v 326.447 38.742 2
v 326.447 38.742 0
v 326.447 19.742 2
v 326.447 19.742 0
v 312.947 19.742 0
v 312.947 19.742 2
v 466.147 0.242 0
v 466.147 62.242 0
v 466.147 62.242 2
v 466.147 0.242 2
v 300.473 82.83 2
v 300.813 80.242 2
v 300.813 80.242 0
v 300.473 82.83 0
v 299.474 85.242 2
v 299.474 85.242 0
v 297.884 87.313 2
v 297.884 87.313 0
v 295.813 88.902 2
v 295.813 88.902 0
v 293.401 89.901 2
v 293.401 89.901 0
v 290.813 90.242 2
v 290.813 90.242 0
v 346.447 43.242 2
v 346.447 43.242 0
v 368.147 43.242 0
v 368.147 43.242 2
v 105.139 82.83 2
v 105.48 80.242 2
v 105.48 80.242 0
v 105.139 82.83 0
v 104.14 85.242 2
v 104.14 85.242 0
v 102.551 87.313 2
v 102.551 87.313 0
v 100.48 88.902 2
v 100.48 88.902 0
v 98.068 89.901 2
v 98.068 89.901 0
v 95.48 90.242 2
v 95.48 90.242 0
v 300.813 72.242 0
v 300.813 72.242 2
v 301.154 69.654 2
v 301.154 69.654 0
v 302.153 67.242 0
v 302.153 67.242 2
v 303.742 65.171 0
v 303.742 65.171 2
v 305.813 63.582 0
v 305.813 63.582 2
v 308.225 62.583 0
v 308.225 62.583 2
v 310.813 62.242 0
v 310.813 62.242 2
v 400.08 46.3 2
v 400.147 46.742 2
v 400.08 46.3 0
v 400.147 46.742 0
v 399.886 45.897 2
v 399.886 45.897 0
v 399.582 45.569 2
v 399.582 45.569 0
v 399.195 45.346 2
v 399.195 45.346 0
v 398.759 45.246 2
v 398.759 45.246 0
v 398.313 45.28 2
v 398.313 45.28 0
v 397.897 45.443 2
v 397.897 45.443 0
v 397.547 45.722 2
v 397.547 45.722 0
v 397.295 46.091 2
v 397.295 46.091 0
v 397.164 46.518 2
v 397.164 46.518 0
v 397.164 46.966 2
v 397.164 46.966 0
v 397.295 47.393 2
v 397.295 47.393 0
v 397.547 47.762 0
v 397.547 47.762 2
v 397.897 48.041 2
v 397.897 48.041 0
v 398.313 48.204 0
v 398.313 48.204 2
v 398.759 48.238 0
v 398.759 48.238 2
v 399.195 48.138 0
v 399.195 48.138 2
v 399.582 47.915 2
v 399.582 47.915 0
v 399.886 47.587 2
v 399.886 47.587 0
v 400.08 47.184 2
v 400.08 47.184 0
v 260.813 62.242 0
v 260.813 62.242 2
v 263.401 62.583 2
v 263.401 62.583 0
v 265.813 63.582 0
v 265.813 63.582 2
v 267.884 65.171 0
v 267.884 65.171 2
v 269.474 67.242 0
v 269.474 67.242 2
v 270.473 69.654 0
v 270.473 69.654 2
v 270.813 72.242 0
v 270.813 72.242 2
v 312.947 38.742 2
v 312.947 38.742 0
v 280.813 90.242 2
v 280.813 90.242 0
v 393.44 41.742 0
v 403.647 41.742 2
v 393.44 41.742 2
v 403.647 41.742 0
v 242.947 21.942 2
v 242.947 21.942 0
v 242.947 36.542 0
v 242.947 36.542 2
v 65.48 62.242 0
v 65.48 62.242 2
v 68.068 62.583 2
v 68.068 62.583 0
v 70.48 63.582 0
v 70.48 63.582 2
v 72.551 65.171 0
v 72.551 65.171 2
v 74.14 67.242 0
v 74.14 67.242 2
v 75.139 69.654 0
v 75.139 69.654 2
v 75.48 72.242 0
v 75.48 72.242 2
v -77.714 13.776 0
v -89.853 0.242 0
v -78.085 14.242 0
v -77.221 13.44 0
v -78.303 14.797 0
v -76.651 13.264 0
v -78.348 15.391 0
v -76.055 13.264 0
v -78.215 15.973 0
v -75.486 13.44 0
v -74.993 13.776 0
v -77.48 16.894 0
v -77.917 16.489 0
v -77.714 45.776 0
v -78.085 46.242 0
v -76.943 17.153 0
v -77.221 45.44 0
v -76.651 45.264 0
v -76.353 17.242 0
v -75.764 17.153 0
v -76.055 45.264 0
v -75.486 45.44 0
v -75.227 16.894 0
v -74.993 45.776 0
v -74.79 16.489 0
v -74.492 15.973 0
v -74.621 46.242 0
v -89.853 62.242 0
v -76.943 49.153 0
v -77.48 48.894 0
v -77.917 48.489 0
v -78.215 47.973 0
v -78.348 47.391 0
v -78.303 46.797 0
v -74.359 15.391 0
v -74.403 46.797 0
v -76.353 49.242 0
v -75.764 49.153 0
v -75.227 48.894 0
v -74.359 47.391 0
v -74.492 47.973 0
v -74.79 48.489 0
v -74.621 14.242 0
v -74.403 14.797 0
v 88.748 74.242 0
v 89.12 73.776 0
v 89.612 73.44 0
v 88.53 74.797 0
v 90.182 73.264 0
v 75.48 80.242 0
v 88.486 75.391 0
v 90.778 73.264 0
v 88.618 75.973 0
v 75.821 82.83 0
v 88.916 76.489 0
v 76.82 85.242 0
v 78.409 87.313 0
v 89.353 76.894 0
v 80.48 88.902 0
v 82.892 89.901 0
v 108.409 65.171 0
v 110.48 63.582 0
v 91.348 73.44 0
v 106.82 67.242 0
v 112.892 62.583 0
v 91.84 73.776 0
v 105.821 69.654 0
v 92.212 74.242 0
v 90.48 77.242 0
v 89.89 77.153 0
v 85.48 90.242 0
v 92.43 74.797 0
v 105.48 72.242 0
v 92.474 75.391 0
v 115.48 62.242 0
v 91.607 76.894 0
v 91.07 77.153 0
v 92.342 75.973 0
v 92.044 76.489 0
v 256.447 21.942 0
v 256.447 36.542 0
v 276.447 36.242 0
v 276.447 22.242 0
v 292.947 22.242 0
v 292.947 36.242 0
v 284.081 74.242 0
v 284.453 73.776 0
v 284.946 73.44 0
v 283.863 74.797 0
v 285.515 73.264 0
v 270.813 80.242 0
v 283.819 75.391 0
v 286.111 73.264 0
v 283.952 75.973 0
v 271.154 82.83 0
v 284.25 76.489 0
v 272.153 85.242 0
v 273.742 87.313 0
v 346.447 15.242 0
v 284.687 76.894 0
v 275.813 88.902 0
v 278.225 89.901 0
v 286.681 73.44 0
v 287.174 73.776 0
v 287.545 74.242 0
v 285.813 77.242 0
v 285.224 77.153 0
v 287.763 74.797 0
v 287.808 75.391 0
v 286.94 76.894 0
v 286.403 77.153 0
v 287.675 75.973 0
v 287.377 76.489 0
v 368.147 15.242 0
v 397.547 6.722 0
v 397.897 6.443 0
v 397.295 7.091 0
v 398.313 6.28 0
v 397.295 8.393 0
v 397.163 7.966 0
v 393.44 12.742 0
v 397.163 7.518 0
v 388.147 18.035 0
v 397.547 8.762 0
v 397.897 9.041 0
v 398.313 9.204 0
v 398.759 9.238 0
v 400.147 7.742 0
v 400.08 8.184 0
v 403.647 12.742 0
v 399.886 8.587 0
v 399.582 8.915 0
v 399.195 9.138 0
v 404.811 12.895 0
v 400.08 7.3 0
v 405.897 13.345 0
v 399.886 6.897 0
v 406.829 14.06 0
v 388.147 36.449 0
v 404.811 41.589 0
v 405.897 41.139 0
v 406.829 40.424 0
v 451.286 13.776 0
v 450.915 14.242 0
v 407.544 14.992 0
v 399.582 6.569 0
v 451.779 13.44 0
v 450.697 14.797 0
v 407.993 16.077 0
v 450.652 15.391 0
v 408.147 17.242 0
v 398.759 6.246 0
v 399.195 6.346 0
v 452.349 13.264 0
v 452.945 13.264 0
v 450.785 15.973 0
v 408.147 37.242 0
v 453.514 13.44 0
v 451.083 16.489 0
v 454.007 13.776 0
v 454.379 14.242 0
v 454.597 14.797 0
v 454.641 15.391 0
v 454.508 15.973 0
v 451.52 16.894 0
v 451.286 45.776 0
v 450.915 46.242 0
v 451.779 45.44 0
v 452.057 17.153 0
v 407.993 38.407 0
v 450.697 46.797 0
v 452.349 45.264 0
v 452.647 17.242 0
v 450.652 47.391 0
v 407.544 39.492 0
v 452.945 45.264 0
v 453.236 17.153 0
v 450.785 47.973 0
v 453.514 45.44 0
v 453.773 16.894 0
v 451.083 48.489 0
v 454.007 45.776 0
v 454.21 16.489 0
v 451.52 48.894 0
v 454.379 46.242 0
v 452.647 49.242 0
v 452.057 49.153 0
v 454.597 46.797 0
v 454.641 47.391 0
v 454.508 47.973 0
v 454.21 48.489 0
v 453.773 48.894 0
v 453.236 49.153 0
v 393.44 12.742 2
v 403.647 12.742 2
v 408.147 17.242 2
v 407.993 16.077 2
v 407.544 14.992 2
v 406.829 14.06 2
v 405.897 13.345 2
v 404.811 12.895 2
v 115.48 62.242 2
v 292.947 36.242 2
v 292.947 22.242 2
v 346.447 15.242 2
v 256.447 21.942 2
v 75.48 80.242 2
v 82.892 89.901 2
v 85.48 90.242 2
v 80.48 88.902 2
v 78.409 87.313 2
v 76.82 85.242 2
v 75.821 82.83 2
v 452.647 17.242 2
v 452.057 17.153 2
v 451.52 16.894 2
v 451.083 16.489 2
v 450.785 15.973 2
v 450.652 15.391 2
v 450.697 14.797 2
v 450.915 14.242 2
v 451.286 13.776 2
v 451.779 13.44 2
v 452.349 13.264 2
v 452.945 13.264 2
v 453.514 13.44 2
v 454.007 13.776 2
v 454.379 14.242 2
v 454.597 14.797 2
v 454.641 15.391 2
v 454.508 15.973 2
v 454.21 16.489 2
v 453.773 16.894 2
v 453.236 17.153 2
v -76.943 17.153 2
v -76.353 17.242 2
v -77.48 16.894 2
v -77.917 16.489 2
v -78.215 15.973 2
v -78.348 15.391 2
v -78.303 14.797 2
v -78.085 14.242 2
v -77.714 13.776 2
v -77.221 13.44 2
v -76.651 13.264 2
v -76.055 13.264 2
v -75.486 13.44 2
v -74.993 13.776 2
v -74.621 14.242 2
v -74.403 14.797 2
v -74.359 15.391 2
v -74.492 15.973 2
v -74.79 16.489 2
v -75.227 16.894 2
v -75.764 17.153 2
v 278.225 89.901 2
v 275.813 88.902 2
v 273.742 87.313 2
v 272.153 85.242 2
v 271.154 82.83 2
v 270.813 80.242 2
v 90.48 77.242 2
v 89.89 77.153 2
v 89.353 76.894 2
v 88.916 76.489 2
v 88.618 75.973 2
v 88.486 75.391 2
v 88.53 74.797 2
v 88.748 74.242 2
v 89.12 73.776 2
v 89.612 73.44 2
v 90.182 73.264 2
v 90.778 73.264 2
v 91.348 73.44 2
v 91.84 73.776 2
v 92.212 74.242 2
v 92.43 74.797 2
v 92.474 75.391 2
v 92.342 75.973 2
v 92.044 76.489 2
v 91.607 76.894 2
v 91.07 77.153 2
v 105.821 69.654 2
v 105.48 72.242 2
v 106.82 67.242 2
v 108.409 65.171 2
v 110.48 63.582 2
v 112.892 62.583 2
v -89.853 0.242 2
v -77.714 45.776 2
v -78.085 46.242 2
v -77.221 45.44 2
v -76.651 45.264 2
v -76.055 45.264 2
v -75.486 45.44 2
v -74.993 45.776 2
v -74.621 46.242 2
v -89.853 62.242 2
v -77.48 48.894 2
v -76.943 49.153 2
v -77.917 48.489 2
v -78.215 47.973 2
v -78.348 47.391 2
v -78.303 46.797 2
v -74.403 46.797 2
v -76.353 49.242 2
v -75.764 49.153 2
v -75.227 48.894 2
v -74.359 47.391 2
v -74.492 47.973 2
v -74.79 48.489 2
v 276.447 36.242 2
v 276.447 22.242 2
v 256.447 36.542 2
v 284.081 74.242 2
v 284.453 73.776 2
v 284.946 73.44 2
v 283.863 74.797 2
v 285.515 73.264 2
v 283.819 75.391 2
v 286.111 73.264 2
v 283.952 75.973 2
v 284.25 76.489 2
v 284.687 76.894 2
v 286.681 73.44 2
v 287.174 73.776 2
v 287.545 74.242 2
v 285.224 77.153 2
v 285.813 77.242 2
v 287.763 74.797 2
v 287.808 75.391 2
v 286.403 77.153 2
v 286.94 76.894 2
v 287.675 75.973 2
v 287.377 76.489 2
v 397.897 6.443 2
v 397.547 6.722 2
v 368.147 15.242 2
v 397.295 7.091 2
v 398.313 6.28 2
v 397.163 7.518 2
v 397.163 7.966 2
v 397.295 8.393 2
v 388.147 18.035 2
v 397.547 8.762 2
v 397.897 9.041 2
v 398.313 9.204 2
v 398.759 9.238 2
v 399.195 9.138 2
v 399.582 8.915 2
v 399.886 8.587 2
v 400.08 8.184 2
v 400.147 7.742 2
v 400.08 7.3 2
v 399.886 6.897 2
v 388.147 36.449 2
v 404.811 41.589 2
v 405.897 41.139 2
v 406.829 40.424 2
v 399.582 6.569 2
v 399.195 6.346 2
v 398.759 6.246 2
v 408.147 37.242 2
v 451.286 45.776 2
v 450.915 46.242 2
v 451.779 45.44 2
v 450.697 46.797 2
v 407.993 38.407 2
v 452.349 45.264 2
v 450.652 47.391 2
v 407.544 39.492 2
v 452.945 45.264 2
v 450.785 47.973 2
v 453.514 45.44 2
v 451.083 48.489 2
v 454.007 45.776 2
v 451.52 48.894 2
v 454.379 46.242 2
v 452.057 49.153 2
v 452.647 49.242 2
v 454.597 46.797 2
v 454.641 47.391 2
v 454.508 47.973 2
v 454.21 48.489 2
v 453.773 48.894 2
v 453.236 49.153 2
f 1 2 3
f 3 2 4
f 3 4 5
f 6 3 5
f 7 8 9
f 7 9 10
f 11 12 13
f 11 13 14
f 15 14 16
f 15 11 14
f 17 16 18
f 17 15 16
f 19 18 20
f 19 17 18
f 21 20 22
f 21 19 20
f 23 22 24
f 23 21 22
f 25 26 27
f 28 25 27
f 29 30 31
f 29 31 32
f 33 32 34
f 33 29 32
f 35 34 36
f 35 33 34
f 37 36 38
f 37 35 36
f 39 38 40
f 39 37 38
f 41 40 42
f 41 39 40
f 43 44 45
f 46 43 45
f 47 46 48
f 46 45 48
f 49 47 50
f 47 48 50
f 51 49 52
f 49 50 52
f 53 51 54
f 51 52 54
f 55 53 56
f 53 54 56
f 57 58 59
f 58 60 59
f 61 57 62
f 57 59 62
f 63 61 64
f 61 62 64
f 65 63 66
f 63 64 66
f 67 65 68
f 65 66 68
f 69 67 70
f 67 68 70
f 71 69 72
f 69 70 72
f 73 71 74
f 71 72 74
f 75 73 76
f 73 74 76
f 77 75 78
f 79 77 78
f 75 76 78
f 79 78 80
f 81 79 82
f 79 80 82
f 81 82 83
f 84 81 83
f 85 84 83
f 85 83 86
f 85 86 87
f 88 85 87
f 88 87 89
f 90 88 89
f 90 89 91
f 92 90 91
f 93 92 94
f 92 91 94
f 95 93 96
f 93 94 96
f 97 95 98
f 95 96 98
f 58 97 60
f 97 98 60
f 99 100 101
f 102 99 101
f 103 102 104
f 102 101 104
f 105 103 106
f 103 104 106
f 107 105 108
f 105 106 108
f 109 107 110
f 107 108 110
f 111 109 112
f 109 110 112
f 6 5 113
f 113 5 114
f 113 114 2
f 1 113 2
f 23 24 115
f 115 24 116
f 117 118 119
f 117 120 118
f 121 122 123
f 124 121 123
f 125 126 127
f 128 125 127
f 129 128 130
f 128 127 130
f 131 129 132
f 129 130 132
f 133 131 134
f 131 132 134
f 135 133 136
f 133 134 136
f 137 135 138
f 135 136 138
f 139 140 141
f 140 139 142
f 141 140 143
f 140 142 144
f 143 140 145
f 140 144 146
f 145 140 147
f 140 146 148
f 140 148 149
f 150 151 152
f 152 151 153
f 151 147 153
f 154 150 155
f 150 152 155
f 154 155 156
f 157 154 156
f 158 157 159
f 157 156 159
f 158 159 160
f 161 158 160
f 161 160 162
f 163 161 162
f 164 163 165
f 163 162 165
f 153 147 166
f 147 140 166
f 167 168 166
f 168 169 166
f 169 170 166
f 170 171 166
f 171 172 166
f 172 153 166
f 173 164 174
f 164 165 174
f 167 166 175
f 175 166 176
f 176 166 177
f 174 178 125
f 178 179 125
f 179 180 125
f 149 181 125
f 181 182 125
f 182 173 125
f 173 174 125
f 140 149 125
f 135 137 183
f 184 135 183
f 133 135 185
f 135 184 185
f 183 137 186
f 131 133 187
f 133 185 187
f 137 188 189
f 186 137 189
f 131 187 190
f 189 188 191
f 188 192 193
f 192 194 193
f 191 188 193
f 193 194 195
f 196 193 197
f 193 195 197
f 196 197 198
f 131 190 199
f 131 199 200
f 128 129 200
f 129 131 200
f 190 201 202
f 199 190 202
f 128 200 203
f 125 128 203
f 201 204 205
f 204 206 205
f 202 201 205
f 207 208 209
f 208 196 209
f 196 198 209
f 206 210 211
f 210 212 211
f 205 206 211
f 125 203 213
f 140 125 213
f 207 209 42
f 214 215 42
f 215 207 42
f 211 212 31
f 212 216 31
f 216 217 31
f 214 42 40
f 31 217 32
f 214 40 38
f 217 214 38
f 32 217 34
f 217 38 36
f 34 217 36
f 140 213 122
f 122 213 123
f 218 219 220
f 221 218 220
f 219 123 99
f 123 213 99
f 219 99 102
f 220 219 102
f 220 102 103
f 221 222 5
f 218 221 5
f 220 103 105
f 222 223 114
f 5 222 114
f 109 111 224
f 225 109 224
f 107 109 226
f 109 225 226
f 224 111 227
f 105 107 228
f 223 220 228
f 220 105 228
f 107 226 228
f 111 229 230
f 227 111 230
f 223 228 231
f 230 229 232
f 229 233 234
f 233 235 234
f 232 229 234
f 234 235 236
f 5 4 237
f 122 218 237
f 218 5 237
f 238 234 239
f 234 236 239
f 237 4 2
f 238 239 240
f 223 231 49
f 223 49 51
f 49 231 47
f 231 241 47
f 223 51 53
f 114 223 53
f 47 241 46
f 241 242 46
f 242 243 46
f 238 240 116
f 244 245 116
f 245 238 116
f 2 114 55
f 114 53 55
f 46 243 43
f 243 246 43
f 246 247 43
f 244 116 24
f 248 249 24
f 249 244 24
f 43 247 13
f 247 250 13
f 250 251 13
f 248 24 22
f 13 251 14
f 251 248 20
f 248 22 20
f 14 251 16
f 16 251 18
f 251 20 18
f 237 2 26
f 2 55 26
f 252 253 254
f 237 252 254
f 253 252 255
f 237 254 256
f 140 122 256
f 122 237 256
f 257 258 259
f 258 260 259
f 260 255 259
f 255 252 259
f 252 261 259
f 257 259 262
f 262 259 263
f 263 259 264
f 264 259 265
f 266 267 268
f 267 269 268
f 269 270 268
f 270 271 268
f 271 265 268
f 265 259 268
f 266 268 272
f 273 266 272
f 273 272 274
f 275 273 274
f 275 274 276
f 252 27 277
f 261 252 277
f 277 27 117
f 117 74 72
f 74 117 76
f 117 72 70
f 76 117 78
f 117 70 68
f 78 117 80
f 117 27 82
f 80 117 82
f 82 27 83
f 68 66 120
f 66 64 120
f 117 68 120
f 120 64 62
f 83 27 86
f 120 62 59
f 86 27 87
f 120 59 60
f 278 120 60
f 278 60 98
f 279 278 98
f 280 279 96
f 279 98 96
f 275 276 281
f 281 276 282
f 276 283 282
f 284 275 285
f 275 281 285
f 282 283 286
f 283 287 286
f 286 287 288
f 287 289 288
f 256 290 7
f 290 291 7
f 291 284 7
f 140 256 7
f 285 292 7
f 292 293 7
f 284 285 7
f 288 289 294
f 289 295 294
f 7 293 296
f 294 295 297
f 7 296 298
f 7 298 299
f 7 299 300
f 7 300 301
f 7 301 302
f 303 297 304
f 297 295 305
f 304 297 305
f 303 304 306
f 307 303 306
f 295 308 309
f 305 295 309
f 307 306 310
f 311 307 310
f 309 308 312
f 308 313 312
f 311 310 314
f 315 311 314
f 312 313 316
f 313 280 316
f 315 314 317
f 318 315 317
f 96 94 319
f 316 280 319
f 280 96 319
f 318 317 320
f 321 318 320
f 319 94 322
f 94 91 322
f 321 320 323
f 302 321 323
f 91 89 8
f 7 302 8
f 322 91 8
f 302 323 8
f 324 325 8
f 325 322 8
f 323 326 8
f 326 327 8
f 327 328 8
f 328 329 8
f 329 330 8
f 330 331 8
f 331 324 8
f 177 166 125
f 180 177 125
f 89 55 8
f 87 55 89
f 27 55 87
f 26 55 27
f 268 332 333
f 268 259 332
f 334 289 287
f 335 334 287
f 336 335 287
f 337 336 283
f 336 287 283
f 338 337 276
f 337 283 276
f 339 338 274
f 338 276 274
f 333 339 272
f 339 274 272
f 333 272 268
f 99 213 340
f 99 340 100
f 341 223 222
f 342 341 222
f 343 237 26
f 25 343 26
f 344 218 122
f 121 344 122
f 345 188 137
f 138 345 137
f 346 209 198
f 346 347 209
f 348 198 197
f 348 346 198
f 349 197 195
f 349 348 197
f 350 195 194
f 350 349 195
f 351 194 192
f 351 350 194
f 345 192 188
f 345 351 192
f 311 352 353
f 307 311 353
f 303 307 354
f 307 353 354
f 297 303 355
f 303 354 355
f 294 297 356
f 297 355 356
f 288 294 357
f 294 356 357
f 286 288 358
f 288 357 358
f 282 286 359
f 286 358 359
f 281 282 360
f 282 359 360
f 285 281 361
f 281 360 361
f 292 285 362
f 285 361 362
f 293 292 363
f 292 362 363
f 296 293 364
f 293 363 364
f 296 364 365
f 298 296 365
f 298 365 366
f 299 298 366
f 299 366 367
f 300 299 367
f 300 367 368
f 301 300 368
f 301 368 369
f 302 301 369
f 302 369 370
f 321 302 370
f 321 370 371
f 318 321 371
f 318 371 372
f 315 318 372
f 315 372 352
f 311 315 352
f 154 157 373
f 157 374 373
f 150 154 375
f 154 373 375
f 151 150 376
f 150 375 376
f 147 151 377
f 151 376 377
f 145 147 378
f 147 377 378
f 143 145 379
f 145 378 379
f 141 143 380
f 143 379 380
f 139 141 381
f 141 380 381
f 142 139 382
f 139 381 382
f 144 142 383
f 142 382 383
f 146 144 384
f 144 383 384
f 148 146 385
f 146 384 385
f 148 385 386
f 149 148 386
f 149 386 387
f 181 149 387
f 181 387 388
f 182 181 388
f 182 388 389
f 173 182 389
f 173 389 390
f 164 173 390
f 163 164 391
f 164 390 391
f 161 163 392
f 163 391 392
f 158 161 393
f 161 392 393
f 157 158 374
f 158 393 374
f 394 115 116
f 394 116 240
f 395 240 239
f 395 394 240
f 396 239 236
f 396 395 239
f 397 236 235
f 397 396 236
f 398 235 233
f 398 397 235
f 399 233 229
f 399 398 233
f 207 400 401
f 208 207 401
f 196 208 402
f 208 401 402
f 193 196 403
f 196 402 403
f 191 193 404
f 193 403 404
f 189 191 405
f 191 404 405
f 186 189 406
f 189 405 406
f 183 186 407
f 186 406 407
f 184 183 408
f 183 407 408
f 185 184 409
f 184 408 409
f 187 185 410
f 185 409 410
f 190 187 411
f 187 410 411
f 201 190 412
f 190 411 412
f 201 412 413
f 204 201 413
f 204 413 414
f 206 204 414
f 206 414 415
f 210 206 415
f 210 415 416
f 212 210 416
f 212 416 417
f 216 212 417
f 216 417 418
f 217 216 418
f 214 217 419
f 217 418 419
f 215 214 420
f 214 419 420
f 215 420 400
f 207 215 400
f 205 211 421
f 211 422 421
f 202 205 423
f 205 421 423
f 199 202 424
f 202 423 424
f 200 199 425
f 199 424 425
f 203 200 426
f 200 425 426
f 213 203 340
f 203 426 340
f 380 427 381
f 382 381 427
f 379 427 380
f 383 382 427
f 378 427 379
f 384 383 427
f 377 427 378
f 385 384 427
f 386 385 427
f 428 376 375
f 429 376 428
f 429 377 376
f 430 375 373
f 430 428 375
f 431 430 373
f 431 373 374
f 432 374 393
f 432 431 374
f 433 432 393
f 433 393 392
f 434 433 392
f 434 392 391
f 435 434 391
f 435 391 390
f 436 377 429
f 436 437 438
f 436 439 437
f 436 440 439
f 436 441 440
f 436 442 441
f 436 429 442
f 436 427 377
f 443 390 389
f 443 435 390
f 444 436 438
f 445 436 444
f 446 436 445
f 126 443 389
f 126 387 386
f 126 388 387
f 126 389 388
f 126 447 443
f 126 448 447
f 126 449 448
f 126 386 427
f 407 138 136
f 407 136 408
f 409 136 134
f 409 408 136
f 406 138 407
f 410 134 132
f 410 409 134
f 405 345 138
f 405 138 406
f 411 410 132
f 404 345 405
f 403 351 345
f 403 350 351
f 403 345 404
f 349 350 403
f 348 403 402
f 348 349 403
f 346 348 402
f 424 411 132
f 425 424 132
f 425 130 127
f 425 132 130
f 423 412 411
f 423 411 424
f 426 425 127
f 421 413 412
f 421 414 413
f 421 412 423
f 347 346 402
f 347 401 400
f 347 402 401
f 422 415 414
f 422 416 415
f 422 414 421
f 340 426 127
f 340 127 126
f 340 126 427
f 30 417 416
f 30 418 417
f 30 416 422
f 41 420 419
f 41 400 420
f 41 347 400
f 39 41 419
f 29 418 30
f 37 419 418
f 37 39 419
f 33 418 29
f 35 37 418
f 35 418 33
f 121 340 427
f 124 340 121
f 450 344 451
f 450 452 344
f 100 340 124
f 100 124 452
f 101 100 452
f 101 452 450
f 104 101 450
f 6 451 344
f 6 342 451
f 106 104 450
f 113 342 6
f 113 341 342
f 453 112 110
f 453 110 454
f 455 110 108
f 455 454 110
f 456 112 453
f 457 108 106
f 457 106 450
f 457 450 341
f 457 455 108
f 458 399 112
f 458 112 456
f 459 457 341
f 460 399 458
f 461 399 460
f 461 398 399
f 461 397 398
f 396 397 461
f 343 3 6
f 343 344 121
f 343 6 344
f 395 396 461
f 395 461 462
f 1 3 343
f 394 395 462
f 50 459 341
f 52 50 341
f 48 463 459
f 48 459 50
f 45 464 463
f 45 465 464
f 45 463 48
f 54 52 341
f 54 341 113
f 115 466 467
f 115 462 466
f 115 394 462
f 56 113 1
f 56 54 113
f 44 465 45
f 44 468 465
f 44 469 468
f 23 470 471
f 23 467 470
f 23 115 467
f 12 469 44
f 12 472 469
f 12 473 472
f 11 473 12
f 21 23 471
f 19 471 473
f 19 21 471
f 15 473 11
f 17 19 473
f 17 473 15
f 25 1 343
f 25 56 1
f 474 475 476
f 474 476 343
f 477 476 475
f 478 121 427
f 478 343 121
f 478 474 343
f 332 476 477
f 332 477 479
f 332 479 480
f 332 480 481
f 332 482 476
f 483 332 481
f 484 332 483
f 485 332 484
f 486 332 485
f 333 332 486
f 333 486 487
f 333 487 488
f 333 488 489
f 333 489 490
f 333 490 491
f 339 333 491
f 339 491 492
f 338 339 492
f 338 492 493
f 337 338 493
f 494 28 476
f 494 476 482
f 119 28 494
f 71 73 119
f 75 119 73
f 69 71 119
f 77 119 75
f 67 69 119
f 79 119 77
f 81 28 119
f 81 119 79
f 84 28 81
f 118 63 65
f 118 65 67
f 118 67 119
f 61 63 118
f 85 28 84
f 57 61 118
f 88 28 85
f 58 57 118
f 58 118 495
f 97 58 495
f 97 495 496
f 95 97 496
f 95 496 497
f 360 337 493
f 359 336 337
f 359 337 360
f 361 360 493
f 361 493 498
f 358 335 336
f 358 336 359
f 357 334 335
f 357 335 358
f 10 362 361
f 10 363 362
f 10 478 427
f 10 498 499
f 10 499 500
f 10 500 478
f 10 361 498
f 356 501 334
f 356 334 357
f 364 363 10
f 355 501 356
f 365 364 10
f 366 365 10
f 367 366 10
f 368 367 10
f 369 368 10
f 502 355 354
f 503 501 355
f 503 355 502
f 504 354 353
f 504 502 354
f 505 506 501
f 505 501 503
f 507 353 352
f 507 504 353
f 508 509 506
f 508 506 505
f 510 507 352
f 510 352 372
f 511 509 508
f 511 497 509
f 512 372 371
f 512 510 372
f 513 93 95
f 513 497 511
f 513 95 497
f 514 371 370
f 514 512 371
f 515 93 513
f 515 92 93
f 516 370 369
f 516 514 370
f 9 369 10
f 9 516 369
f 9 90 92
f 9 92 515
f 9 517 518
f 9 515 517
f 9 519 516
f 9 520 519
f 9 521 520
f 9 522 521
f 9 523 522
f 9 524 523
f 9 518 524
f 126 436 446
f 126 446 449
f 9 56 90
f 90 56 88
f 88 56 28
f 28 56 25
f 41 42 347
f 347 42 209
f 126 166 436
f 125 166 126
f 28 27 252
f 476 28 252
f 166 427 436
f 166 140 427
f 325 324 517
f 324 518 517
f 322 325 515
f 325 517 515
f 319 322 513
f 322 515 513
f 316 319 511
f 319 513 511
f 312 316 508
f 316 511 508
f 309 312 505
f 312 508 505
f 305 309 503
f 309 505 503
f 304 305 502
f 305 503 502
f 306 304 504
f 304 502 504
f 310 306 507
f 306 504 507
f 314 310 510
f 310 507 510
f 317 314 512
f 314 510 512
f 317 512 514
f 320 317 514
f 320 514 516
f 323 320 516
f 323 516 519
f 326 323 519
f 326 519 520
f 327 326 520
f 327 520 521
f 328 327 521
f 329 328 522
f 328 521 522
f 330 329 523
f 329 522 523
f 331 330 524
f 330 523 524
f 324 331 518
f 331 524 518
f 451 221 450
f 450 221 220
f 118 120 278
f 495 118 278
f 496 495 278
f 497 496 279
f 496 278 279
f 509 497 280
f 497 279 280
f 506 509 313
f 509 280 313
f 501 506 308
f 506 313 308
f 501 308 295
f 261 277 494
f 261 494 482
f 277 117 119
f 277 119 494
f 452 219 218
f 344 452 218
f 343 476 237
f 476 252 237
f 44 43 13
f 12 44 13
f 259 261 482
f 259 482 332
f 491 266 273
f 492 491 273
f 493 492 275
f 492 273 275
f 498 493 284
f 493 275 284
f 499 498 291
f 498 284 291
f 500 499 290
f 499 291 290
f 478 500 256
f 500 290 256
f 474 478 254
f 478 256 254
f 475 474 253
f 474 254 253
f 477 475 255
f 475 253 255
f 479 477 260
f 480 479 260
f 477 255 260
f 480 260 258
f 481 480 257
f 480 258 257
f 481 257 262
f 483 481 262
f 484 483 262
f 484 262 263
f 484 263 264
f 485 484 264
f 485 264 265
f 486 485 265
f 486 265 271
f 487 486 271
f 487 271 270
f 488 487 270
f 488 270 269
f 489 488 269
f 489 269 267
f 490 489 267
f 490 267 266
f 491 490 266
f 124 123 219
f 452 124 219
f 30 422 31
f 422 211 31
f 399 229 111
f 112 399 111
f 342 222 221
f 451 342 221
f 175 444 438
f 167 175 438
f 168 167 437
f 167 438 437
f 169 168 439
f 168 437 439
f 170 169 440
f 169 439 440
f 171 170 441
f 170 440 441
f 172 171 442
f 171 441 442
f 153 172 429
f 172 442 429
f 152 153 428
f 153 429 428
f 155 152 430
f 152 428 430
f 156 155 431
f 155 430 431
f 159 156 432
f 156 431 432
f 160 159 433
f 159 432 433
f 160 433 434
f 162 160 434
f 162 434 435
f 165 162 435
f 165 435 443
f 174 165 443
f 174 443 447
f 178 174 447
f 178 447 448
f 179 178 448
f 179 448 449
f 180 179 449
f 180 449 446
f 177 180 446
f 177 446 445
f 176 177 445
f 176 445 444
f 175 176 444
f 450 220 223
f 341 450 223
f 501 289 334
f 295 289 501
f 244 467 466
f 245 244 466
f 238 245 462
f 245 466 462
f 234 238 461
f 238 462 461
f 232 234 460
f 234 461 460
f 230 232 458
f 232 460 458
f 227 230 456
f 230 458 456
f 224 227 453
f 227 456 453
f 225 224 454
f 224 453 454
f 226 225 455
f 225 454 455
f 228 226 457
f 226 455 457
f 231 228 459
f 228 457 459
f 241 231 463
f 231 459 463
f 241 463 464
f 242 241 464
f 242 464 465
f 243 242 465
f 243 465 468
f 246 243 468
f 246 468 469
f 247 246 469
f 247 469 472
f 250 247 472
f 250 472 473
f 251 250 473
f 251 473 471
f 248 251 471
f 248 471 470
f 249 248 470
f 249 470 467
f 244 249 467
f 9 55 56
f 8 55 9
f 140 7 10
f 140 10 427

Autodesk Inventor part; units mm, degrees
ref_plane "YZ Plane" through (0, 0, 0) normal (1, 0, 0) x (0, 1, 0)
ref_plane "XZ Plane" through (0, 0, 0) normal (0, 1, 0) x (-1, 0, 0)
ref_plane "XY Plane" through (0, 0, 0) normal (0, 0, 1) x (1, 0, 0)
sketch "Szkic1" plane through (0, 0, 0) normal (0, 0, 1) x (1, 0, 0)
  line L0 (-89.8533, 62.242) -> (466.1467, 62.242)
  line L1 (466.1467, 62.242) -> (466.1467, 0.242)
  line L2 (466.1467, 0.242) -> (-89.8533, 0.242)
  line L3 (-89.8533, 0.242) -> (-89.8533, 62.242)
  line L4 (75.48, 62.242) -> (105.48, 62.242)
  line L5 (105.48, 62.242) -> (105.48, 90.242)
  line L6 (105.48, 90.242) -> (75.48, 90.242)
  line L7 (75.48, 90.242) -> (75.48, 62.242)
  line L8 (270.8133, 62.242) -> (300.8133, 62.242)
  line L9 (300.8133, 62.242) -> (300.8133, 90.242)
  line L10 (300.8133, 90.242) -> (270.8133, 90.242)
  line L11 (270.8133, 90.242) -> (270.8133, 62.242)
  arc A0 (403.6467, 13.242) -> (407.6467, 17.242) centre (403.6467, 17.242) ccw
  line L12 (407.6467, 17.242) -> (407.6467, 37.242)
  arc A1 (407.6467, 37.242) -> (403.6467, 41.242) centre (403.6467, 37.242) ccw
  line L13 (388.647, 36.242) -> (393.647, 41.242)
  line L14 (388.647, 36.242) -> (388.647, 18.242)
  line L15 (393.647, 13.242) -> (388.647, 18.242)
  line L16 (393.647, 41.242) -> (403.6467, 41.242)
  line L17 (393.647, 13.242) -> (403.6467, 13.242)
  line L18 (393.4399, 41.742) -> (388.147, 36.4491)
  line L19 (388.147, 36.4491) -> (388.147, 18.0348)
  line L20 (388.147, 18.0348) -> (393.4399, 12.742)
  line L21 (393.4399, 12.742) -> (403.6467, 12.742)
  arc A2 (403.6467, 12.742) -> (408.1467, 17.242) centre (403.6467, 17.242) ccw
  line L22 (408.1467, 17.242) -> (408.1467, 37.242)
  arc A3 (408.1467, 37.242) -> (403.6467, 41.742) centre (403.6467, 37.242) ccw
  line L23 (403.6467, 41.742) -> (393.4399, 41.742)
  circle A4 centre (398.6468, 46.742) radius 1.5
  circle A5 centre (398.6467, 7.742) radius 1.5
  line L24 (346.447, 43.242) -> (368.147, 43.242)
  line L25 (368.147, 43.242) -> (368.147, 15.242)
  line L26 (368.147, 15.242) -> (346.447, 15.242)
  line L27 (346.447, 15.242) -> (346.447, 43.242)
  line L28 (276.447, 36.242) -> (292.947, 36.242)
  line L29 (292.947, 36.242) -> (292.947, 22.242)
  line L30 (292.947, 22.242) -> (276.447, 22.242)
  line L31 (276.447, 22.242) -> (276.447, 36.242)
  line L32 (242.947, 36.542) -> (256.447, 36.542)
  line L33 (256.447, 36.542) -> (256.447, 21.942)
  line L34 (256.447, 21.942) -> (242.947, 21.942)
  line L35 (242.947, 21.942) -> (242.947, 36.542)
  line L36 (312.947, 38.742) -> (326.447, 38.742)
  line L37 (326.447, 38.742) -> (326.447, 19.742)
  line L38 (326.447, 19.742) -> (312.947, 19.742)
  line L39 (312.947, 19.742) -> (312.947, 38.742)
  point P0 (90.48, 75.242)
  point P1 (285.8133, 75.242)
  point P2 (-76.3533, 47.242)
  point P3 (452.6467, 47.242)
  point P4 (-76.3533, 15.242)
  point P5 (452.6467, 15.242)
  dimension "d0" = 556
  dimension "d1" = 62
  dimension "d2" = 30
  dimension "d3" = 28
  dimension "d4" = 30
  dimension "d5" = 28
  dimension "d6" = 165.3333
  dimension "d10" = 165.3333
  dimension "d12" = 15
  dimension "d13" = 15
  dimension "d14" = 15
  dimension "d15" = 15
  dimension "d16" = 13.5
  dimension "d17" = 13.5
  dimension "d18" = 15
  dimension "d19" = 15
  dimension "d27" = 13.5
  dimension "d28" = 13.5
  dimension "d29" = 15
  dimension "d30" = 15
  dimension "d42" = 18.9997
  dimension "d43" = 58.5
  dimension "d44" = 28
  dimension "d45" = 21
  dimension "d46" = 14.9997
  dimension "d47" = 4
  dimension "d48" = 4
  dimension "d49" = 14.9997
  dimension "d50" = 5
  dimension "d51" = 5
  dimension "d54" = 0.5
  dimension "d55" = 5.5
  dimension "d56" = 5.5
  dimension "d57" = 8.9999
  dimension "d58" = 9
  dimension "d59" = 3
  dimension "d60" = 3
  dimension "d61" = 10.2068
  dimension "d62" = 9.9997
  dimension "d63" = 9.9997
  dimension "d64" = 10.2068
  dimension "d65" = 28
  dimension "d66" = 21.7
  dimension "d69" = 16.5
  dimension "d71" = 14
  dimension "d72" = 14.6
  dimension "d73" = 13.5
  dimension "d74" = 19
  dimension "d75" = 13.5
  dimension "d76" = 19
  dimension "d77" = 23.5
  dimension "d78" = 26
  dimension "d79" = 25.7
  dimension "d80" = 20
  dimension "d81" = 20
  dimension "d82" = 20
  dimension "d83" = 20
extrude "Wyciągnięcie proste1" add sketch "Szkic1" along normal blind 2 contours L0 L1 L2 L3 | L7 L6 L5 L0 | L11 L10 L9 L0 | L17 L15 L14 L13 L16 A1 L12 A0 | L23 A3 L22 A2 L21 L20 L19 L18 | A4 | A5 | L24 L25 L26 L27 | L28 L29 L30 L31 | L32 L33 L34 L35 | L36 L37 L38 L39
fillet "Zaokrąglenie1" radius 10 8 edges at (75.48, 62.242, 1) (75.48, 90.242, 1) (105.48, 90.242, 1) (105.48, 62.242, 1) (270.8133, 62.242, 1) (270.8133, 90.242, 1) (300.8133, 90.242, 1) (300.8133, 62.242, 1)
hole "Otwór1" at (90.48, 75.242, 0) at (285.8133, 75.242, 0) at (-76.3533, 47.242, 0) at (452.6467, 47.242, 0) at (-76.3533, 15.242, 0) at (452.6467, 15.242, 0) direction (0, 0, 1) diameter 4 end through all
extrude "Wyciągnięcie proste2" cut sketch "Szkic1" along normal through all contours L17 L15 L14 L13 L16 A1 L12 A0 | L23 A3 L22 A2 L21 L20 L19 L18 | A4 | A5 | L24 L25 L26 L27 | L28 L29 L30 L31 | L32 L33 L34 L35 | L36 L37 L38 L39
equation "\"d6\" = -0.333333 * d4 + 0.333333 * d0 - 0.333333 * d2"
equation "\"d10\" = d6"
equation "\"d14\" = 0.5 * d2"
equation "\"d15\" = 0.5 * d4"
equation "\"d19\" = d18"
equation "\"d27\" = d16"
equation "\"d28\" = d17"
equation "\"d29\" = d18"
equation "\"d30\" = d19"
properties part number "LC_ALU_2mm_Back_Plate"
